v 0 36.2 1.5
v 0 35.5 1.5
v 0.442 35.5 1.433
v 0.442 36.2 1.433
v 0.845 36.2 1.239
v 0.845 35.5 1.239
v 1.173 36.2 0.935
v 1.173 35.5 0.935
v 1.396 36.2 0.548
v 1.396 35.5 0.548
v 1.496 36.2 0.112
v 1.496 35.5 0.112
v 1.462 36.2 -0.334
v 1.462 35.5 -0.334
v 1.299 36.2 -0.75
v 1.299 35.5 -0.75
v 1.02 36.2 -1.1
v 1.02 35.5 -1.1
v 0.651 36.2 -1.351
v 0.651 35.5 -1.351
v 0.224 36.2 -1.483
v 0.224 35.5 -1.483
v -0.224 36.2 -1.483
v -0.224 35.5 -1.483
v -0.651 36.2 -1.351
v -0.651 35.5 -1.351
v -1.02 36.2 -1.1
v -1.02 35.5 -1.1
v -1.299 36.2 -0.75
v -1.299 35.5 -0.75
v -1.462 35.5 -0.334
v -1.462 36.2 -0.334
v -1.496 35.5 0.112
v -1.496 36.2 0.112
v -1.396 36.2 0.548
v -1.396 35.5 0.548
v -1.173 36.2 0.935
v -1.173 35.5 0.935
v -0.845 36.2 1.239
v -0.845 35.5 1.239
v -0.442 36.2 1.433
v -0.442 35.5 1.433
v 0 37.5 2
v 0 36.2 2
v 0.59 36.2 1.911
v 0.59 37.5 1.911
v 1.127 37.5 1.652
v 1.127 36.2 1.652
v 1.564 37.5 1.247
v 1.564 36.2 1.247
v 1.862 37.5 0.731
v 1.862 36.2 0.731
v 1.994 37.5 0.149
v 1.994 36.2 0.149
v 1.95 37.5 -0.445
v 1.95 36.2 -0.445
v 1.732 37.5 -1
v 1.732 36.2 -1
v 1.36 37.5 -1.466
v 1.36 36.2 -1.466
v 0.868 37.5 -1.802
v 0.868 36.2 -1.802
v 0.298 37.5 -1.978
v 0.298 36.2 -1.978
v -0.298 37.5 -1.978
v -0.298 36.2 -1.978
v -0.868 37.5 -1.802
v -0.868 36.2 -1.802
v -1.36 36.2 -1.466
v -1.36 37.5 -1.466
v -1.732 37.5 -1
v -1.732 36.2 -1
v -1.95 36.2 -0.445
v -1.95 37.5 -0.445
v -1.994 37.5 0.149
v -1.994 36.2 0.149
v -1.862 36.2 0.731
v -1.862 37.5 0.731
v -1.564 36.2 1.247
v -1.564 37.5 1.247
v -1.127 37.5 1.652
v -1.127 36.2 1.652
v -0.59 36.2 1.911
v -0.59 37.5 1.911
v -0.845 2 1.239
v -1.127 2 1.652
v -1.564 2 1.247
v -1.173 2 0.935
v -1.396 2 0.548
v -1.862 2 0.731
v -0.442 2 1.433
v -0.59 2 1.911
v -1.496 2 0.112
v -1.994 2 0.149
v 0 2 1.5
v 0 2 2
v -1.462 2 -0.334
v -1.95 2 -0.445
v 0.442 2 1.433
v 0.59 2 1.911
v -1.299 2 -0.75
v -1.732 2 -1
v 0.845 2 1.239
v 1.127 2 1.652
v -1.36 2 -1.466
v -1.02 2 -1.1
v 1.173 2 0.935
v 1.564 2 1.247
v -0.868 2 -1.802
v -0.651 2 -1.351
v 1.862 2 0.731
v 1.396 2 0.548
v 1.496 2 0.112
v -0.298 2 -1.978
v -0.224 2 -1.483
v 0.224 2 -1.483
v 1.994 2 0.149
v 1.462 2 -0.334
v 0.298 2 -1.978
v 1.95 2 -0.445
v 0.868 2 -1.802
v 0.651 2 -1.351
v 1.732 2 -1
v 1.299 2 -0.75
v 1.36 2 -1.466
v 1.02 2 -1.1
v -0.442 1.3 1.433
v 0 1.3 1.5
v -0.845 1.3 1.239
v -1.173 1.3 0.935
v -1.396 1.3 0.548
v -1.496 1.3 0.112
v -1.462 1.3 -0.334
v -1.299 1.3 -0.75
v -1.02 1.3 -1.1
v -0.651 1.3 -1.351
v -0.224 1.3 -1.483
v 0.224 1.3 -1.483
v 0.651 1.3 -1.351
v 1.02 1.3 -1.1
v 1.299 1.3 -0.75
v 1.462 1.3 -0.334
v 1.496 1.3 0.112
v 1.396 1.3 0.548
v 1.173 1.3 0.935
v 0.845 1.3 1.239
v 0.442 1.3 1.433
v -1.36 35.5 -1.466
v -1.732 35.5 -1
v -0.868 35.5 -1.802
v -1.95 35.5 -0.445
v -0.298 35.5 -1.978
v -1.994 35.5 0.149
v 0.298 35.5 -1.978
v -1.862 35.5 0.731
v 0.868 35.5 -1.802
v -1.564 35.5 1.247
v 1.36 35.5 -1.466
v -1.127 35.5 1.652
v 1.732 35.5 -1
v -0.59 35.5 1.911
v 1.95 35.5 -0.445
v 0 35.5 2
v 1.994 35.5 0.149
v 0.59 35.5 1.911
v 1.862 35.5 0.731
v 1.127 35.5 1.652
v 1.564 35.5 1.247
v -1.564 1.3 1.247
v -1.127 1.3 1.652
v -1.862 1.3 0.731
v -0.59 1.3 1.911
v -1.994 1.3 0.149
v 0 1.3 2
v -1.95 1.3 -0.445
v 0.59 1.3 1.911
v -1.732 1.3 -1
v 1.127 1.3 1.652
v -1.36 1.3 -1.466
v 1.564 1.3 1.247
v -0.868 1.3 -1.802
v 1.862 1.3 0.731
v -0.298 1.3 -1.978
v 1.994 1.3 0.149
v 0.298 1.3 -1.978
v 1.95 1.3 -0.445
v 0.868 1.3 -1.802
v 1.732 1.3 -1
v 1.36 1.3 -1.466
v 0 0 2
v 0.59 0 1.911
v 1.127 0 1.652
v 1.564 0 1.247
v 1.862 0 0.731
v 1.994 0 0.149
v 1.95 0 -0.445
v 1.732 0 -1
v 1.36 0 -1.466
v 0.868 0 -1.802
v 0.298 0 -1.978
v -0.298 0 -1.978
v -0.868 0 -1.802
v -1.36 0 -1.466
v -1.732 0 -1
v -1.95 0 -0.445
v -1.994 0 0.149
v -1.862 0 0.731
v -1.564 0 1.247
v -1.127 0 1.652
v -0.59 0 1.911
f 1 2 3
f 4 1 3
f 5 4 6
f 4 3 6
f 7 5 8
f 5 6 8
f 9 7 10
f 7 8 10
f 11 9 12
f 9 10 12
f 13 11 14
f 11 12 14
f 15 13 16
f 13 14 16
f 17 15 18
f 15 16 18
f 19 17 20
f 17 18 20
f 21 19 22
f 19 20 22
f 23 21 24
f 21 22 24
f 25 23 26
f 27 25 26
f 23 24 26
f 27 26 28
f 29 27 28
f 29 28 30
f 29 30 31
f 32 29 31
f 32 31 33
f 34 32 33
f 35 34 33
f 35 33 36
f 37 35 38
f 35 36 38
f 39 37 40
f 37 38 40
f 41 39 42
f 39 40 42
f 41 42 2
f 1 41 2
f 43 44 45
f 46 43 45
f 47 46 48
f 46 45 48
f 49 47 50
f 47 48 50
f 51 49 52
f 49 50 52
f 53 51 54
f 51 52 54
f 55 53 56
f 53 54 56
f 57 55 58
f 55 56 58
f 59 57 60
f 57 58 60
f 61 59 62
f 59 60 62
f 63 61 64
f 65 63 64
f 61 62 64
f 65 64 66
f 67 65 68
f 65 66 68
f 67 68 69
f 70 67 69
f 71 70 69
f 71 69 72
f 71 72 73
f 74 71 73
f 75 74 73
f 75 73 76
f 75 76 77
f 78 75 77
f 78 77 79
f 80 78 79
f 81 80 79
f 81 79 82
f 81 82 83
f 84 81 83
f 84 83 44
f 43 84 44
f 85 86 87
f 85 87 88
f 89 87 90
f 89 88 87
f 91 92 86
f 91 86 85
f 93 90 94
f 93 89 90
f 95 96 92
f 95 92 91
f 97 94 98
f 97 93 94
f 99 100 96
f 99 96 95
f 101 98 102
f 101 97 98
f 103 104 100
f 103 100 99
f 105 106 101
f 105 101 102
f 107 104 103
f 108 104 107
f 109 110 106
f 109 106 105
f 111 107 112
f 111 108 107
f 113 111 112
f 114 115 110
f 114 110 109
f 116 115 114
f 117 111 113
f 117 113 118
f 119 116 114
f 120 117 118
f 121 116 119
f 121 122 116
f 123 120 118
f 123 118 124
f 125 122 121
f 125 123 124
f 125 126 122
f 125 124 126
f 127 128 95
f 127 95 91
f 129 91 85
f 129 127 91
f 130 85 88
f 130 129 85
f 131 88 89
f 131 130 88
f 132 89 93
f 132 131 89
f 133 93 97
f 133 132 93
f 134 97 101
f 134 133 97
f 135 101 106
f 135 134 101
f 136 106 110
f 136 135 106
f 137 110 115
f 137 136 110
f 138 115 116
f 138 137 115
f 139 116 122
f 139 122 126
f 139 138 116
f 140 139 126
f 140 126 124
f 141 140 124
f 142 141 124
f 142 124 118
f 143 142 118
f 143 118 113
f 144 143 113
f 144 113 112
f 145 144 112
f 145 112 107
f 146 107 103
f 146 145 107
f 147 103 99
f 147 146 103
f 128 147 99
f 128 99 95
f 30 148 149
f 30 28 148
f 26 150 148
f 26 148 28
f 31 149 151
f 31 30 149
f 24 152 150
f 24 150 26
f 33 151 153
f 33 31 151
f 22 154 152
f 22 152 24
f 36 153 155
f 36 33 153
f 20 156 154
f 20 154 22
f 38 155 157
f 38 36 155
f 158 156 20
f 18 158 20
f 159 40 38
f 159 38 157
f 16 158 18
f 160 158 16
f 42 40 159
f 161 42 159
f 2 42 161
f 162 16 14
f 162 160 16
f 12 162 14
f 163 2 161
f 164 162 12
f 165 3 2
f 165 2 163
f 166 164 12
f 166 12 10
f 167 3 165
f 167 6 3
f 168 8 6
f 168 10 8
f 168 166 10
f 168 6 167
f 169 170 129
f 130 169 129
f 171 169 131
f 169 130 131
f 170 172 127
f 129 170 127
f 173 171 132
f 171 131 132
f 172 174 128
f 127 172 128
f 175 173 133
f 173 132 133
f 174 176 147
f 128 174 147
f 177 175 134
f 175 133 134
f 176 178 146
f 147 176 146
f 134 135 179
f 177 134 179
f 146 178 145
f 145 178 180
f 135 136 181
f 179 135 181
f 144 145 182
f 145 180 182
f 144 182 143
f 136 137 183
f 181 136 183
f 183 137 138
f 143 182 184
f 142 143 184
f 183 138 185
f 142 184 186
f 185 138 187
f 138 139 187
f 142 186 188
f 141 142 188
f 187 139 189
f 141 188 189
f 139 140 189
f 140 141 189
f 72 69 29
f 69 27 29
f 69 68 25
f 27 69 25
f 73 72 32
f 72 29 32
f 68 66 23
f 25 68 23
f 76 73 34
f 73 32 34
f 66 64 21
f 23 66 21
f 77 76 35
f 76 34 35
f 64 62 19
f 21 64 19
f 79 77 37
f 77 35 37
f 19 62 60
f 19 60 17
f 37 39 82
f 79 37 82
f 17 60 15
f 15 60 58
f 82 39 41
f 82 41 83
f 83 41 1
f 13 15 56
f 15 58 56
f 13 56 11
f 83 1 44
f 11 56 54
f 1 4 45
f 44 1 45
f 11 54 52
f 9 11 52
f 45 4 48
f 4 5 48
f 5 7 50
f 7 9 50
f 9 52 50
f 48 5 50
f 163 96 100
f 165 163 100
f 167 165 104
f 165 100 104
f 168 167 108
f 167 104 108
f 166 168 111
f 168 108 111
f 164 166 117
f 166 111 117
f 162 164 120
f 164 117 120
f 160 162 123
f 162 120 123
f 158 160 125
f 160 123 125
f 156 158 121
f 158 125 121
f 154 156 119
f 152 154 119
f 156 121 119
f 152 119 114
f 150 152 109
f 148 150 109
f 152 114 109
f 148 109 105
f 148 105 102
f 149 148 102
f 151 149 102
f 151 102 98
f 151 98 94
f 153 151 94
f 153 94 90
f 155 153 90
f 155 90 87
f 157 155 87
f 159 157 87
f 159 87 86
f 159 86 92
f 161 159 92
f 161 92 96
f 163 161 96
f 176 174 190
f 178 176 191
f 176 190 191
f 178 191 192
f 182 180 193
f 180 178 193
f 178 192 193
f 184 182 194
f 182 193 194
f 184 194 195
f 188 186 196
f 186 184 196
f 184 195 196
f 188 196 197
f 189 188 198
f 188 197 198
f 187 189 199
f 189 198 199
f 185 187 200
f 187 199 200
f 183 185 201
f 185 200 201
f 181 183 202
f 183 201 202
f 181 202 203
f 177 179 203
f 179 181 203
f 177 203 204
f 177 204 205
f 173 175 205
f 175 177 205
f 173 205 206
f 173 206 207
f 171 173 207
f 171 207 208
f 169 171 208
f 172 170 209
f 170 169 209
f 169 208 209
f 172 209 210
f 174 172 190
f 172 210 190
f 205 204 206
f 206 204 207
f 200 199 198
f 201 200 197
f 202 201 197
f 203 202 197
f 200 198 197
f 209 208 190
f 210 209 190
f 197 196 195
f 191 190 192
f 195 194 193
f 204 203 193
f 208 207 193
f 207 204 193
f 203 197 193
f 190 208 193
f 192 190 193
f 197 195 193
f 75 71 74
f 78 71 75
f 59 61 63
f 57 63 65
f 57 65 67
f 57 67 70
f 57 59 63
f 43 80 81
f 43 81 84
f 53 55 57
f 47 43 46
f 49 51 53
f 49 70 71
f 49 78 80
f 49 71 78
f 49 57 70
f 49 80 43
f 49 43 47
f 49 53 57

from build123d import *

# Parameters (mm, degrees)
SKETCH_1_R          = 2
EXTRUDE_1_DEPTH     = 37.5
CUT_EXTRUDE_START   = -2
SKETCH_2_R          = 2
SKETCH_2_R_2        = 1.5
CUT_EXTRUDE_1_DEPTH = 0.7
CUT_EXTRUDE_START_2 = -1.3
SKETCH_3_R          = 2
SKETCH_3_R_2        = 1.5
CUT_EXTRUDE_2_DEPTH = 0.7


with BuildPart() as part:
    # 스케치1 → 보스-돌출1 (new body)
    with BuildSketch(Plane(origin=(0, 0, 0), x_dir=(1, 0, 0), z_dir=(0, 1, 0))):
        with Locations(Location((0, 0, 0), (0, 0, 270))):
            Circle(SKETCH_1_R)
    extrude(amount=EXTRUDE_1_DEPTH)

    # 스케치2 → 컷-돌출1 (cut)
    with BuildSketch(Plane(origin=(0, 37.5, 0), x_dir=(1, 0, 0), z_dir=(0, 1, 0)).offset(CUT_EXTRUDE_START)):
        with Locations(Location((0, 0, 0), (0, 0, 270))):
            Circle(SKETCH_2_R)
        with Locations(Location((0, 0, 0), (0, 0, 270))):
            Circle(SKETCH_2_R_2, mode=Mode.SUBTRACT)
    extrude(amount=CUT_EXTRUDE_1_DEPTH, mode=Mode.SUBTRACT)

    # 스케치3 → 컷-돌출2 (cut)
    with BuildSketch(Plane.XZ.offset(CUT_EXTRUDE_START_2)):
        with Locations(Location((0, 0, 0), (0, 0, 270))):
            Circle(SKETCH_3_R)
        with Locations(Location((0, 0, 0), (0, 0, 90))):
            Circle(SKETCH_3_R_2, mode=Mode.SUBTRACT)
    extrude(amount=-CUT_EXTRUDE_2_DEPTH, mode=Mode.SUBTRACT)


solid = part.part
